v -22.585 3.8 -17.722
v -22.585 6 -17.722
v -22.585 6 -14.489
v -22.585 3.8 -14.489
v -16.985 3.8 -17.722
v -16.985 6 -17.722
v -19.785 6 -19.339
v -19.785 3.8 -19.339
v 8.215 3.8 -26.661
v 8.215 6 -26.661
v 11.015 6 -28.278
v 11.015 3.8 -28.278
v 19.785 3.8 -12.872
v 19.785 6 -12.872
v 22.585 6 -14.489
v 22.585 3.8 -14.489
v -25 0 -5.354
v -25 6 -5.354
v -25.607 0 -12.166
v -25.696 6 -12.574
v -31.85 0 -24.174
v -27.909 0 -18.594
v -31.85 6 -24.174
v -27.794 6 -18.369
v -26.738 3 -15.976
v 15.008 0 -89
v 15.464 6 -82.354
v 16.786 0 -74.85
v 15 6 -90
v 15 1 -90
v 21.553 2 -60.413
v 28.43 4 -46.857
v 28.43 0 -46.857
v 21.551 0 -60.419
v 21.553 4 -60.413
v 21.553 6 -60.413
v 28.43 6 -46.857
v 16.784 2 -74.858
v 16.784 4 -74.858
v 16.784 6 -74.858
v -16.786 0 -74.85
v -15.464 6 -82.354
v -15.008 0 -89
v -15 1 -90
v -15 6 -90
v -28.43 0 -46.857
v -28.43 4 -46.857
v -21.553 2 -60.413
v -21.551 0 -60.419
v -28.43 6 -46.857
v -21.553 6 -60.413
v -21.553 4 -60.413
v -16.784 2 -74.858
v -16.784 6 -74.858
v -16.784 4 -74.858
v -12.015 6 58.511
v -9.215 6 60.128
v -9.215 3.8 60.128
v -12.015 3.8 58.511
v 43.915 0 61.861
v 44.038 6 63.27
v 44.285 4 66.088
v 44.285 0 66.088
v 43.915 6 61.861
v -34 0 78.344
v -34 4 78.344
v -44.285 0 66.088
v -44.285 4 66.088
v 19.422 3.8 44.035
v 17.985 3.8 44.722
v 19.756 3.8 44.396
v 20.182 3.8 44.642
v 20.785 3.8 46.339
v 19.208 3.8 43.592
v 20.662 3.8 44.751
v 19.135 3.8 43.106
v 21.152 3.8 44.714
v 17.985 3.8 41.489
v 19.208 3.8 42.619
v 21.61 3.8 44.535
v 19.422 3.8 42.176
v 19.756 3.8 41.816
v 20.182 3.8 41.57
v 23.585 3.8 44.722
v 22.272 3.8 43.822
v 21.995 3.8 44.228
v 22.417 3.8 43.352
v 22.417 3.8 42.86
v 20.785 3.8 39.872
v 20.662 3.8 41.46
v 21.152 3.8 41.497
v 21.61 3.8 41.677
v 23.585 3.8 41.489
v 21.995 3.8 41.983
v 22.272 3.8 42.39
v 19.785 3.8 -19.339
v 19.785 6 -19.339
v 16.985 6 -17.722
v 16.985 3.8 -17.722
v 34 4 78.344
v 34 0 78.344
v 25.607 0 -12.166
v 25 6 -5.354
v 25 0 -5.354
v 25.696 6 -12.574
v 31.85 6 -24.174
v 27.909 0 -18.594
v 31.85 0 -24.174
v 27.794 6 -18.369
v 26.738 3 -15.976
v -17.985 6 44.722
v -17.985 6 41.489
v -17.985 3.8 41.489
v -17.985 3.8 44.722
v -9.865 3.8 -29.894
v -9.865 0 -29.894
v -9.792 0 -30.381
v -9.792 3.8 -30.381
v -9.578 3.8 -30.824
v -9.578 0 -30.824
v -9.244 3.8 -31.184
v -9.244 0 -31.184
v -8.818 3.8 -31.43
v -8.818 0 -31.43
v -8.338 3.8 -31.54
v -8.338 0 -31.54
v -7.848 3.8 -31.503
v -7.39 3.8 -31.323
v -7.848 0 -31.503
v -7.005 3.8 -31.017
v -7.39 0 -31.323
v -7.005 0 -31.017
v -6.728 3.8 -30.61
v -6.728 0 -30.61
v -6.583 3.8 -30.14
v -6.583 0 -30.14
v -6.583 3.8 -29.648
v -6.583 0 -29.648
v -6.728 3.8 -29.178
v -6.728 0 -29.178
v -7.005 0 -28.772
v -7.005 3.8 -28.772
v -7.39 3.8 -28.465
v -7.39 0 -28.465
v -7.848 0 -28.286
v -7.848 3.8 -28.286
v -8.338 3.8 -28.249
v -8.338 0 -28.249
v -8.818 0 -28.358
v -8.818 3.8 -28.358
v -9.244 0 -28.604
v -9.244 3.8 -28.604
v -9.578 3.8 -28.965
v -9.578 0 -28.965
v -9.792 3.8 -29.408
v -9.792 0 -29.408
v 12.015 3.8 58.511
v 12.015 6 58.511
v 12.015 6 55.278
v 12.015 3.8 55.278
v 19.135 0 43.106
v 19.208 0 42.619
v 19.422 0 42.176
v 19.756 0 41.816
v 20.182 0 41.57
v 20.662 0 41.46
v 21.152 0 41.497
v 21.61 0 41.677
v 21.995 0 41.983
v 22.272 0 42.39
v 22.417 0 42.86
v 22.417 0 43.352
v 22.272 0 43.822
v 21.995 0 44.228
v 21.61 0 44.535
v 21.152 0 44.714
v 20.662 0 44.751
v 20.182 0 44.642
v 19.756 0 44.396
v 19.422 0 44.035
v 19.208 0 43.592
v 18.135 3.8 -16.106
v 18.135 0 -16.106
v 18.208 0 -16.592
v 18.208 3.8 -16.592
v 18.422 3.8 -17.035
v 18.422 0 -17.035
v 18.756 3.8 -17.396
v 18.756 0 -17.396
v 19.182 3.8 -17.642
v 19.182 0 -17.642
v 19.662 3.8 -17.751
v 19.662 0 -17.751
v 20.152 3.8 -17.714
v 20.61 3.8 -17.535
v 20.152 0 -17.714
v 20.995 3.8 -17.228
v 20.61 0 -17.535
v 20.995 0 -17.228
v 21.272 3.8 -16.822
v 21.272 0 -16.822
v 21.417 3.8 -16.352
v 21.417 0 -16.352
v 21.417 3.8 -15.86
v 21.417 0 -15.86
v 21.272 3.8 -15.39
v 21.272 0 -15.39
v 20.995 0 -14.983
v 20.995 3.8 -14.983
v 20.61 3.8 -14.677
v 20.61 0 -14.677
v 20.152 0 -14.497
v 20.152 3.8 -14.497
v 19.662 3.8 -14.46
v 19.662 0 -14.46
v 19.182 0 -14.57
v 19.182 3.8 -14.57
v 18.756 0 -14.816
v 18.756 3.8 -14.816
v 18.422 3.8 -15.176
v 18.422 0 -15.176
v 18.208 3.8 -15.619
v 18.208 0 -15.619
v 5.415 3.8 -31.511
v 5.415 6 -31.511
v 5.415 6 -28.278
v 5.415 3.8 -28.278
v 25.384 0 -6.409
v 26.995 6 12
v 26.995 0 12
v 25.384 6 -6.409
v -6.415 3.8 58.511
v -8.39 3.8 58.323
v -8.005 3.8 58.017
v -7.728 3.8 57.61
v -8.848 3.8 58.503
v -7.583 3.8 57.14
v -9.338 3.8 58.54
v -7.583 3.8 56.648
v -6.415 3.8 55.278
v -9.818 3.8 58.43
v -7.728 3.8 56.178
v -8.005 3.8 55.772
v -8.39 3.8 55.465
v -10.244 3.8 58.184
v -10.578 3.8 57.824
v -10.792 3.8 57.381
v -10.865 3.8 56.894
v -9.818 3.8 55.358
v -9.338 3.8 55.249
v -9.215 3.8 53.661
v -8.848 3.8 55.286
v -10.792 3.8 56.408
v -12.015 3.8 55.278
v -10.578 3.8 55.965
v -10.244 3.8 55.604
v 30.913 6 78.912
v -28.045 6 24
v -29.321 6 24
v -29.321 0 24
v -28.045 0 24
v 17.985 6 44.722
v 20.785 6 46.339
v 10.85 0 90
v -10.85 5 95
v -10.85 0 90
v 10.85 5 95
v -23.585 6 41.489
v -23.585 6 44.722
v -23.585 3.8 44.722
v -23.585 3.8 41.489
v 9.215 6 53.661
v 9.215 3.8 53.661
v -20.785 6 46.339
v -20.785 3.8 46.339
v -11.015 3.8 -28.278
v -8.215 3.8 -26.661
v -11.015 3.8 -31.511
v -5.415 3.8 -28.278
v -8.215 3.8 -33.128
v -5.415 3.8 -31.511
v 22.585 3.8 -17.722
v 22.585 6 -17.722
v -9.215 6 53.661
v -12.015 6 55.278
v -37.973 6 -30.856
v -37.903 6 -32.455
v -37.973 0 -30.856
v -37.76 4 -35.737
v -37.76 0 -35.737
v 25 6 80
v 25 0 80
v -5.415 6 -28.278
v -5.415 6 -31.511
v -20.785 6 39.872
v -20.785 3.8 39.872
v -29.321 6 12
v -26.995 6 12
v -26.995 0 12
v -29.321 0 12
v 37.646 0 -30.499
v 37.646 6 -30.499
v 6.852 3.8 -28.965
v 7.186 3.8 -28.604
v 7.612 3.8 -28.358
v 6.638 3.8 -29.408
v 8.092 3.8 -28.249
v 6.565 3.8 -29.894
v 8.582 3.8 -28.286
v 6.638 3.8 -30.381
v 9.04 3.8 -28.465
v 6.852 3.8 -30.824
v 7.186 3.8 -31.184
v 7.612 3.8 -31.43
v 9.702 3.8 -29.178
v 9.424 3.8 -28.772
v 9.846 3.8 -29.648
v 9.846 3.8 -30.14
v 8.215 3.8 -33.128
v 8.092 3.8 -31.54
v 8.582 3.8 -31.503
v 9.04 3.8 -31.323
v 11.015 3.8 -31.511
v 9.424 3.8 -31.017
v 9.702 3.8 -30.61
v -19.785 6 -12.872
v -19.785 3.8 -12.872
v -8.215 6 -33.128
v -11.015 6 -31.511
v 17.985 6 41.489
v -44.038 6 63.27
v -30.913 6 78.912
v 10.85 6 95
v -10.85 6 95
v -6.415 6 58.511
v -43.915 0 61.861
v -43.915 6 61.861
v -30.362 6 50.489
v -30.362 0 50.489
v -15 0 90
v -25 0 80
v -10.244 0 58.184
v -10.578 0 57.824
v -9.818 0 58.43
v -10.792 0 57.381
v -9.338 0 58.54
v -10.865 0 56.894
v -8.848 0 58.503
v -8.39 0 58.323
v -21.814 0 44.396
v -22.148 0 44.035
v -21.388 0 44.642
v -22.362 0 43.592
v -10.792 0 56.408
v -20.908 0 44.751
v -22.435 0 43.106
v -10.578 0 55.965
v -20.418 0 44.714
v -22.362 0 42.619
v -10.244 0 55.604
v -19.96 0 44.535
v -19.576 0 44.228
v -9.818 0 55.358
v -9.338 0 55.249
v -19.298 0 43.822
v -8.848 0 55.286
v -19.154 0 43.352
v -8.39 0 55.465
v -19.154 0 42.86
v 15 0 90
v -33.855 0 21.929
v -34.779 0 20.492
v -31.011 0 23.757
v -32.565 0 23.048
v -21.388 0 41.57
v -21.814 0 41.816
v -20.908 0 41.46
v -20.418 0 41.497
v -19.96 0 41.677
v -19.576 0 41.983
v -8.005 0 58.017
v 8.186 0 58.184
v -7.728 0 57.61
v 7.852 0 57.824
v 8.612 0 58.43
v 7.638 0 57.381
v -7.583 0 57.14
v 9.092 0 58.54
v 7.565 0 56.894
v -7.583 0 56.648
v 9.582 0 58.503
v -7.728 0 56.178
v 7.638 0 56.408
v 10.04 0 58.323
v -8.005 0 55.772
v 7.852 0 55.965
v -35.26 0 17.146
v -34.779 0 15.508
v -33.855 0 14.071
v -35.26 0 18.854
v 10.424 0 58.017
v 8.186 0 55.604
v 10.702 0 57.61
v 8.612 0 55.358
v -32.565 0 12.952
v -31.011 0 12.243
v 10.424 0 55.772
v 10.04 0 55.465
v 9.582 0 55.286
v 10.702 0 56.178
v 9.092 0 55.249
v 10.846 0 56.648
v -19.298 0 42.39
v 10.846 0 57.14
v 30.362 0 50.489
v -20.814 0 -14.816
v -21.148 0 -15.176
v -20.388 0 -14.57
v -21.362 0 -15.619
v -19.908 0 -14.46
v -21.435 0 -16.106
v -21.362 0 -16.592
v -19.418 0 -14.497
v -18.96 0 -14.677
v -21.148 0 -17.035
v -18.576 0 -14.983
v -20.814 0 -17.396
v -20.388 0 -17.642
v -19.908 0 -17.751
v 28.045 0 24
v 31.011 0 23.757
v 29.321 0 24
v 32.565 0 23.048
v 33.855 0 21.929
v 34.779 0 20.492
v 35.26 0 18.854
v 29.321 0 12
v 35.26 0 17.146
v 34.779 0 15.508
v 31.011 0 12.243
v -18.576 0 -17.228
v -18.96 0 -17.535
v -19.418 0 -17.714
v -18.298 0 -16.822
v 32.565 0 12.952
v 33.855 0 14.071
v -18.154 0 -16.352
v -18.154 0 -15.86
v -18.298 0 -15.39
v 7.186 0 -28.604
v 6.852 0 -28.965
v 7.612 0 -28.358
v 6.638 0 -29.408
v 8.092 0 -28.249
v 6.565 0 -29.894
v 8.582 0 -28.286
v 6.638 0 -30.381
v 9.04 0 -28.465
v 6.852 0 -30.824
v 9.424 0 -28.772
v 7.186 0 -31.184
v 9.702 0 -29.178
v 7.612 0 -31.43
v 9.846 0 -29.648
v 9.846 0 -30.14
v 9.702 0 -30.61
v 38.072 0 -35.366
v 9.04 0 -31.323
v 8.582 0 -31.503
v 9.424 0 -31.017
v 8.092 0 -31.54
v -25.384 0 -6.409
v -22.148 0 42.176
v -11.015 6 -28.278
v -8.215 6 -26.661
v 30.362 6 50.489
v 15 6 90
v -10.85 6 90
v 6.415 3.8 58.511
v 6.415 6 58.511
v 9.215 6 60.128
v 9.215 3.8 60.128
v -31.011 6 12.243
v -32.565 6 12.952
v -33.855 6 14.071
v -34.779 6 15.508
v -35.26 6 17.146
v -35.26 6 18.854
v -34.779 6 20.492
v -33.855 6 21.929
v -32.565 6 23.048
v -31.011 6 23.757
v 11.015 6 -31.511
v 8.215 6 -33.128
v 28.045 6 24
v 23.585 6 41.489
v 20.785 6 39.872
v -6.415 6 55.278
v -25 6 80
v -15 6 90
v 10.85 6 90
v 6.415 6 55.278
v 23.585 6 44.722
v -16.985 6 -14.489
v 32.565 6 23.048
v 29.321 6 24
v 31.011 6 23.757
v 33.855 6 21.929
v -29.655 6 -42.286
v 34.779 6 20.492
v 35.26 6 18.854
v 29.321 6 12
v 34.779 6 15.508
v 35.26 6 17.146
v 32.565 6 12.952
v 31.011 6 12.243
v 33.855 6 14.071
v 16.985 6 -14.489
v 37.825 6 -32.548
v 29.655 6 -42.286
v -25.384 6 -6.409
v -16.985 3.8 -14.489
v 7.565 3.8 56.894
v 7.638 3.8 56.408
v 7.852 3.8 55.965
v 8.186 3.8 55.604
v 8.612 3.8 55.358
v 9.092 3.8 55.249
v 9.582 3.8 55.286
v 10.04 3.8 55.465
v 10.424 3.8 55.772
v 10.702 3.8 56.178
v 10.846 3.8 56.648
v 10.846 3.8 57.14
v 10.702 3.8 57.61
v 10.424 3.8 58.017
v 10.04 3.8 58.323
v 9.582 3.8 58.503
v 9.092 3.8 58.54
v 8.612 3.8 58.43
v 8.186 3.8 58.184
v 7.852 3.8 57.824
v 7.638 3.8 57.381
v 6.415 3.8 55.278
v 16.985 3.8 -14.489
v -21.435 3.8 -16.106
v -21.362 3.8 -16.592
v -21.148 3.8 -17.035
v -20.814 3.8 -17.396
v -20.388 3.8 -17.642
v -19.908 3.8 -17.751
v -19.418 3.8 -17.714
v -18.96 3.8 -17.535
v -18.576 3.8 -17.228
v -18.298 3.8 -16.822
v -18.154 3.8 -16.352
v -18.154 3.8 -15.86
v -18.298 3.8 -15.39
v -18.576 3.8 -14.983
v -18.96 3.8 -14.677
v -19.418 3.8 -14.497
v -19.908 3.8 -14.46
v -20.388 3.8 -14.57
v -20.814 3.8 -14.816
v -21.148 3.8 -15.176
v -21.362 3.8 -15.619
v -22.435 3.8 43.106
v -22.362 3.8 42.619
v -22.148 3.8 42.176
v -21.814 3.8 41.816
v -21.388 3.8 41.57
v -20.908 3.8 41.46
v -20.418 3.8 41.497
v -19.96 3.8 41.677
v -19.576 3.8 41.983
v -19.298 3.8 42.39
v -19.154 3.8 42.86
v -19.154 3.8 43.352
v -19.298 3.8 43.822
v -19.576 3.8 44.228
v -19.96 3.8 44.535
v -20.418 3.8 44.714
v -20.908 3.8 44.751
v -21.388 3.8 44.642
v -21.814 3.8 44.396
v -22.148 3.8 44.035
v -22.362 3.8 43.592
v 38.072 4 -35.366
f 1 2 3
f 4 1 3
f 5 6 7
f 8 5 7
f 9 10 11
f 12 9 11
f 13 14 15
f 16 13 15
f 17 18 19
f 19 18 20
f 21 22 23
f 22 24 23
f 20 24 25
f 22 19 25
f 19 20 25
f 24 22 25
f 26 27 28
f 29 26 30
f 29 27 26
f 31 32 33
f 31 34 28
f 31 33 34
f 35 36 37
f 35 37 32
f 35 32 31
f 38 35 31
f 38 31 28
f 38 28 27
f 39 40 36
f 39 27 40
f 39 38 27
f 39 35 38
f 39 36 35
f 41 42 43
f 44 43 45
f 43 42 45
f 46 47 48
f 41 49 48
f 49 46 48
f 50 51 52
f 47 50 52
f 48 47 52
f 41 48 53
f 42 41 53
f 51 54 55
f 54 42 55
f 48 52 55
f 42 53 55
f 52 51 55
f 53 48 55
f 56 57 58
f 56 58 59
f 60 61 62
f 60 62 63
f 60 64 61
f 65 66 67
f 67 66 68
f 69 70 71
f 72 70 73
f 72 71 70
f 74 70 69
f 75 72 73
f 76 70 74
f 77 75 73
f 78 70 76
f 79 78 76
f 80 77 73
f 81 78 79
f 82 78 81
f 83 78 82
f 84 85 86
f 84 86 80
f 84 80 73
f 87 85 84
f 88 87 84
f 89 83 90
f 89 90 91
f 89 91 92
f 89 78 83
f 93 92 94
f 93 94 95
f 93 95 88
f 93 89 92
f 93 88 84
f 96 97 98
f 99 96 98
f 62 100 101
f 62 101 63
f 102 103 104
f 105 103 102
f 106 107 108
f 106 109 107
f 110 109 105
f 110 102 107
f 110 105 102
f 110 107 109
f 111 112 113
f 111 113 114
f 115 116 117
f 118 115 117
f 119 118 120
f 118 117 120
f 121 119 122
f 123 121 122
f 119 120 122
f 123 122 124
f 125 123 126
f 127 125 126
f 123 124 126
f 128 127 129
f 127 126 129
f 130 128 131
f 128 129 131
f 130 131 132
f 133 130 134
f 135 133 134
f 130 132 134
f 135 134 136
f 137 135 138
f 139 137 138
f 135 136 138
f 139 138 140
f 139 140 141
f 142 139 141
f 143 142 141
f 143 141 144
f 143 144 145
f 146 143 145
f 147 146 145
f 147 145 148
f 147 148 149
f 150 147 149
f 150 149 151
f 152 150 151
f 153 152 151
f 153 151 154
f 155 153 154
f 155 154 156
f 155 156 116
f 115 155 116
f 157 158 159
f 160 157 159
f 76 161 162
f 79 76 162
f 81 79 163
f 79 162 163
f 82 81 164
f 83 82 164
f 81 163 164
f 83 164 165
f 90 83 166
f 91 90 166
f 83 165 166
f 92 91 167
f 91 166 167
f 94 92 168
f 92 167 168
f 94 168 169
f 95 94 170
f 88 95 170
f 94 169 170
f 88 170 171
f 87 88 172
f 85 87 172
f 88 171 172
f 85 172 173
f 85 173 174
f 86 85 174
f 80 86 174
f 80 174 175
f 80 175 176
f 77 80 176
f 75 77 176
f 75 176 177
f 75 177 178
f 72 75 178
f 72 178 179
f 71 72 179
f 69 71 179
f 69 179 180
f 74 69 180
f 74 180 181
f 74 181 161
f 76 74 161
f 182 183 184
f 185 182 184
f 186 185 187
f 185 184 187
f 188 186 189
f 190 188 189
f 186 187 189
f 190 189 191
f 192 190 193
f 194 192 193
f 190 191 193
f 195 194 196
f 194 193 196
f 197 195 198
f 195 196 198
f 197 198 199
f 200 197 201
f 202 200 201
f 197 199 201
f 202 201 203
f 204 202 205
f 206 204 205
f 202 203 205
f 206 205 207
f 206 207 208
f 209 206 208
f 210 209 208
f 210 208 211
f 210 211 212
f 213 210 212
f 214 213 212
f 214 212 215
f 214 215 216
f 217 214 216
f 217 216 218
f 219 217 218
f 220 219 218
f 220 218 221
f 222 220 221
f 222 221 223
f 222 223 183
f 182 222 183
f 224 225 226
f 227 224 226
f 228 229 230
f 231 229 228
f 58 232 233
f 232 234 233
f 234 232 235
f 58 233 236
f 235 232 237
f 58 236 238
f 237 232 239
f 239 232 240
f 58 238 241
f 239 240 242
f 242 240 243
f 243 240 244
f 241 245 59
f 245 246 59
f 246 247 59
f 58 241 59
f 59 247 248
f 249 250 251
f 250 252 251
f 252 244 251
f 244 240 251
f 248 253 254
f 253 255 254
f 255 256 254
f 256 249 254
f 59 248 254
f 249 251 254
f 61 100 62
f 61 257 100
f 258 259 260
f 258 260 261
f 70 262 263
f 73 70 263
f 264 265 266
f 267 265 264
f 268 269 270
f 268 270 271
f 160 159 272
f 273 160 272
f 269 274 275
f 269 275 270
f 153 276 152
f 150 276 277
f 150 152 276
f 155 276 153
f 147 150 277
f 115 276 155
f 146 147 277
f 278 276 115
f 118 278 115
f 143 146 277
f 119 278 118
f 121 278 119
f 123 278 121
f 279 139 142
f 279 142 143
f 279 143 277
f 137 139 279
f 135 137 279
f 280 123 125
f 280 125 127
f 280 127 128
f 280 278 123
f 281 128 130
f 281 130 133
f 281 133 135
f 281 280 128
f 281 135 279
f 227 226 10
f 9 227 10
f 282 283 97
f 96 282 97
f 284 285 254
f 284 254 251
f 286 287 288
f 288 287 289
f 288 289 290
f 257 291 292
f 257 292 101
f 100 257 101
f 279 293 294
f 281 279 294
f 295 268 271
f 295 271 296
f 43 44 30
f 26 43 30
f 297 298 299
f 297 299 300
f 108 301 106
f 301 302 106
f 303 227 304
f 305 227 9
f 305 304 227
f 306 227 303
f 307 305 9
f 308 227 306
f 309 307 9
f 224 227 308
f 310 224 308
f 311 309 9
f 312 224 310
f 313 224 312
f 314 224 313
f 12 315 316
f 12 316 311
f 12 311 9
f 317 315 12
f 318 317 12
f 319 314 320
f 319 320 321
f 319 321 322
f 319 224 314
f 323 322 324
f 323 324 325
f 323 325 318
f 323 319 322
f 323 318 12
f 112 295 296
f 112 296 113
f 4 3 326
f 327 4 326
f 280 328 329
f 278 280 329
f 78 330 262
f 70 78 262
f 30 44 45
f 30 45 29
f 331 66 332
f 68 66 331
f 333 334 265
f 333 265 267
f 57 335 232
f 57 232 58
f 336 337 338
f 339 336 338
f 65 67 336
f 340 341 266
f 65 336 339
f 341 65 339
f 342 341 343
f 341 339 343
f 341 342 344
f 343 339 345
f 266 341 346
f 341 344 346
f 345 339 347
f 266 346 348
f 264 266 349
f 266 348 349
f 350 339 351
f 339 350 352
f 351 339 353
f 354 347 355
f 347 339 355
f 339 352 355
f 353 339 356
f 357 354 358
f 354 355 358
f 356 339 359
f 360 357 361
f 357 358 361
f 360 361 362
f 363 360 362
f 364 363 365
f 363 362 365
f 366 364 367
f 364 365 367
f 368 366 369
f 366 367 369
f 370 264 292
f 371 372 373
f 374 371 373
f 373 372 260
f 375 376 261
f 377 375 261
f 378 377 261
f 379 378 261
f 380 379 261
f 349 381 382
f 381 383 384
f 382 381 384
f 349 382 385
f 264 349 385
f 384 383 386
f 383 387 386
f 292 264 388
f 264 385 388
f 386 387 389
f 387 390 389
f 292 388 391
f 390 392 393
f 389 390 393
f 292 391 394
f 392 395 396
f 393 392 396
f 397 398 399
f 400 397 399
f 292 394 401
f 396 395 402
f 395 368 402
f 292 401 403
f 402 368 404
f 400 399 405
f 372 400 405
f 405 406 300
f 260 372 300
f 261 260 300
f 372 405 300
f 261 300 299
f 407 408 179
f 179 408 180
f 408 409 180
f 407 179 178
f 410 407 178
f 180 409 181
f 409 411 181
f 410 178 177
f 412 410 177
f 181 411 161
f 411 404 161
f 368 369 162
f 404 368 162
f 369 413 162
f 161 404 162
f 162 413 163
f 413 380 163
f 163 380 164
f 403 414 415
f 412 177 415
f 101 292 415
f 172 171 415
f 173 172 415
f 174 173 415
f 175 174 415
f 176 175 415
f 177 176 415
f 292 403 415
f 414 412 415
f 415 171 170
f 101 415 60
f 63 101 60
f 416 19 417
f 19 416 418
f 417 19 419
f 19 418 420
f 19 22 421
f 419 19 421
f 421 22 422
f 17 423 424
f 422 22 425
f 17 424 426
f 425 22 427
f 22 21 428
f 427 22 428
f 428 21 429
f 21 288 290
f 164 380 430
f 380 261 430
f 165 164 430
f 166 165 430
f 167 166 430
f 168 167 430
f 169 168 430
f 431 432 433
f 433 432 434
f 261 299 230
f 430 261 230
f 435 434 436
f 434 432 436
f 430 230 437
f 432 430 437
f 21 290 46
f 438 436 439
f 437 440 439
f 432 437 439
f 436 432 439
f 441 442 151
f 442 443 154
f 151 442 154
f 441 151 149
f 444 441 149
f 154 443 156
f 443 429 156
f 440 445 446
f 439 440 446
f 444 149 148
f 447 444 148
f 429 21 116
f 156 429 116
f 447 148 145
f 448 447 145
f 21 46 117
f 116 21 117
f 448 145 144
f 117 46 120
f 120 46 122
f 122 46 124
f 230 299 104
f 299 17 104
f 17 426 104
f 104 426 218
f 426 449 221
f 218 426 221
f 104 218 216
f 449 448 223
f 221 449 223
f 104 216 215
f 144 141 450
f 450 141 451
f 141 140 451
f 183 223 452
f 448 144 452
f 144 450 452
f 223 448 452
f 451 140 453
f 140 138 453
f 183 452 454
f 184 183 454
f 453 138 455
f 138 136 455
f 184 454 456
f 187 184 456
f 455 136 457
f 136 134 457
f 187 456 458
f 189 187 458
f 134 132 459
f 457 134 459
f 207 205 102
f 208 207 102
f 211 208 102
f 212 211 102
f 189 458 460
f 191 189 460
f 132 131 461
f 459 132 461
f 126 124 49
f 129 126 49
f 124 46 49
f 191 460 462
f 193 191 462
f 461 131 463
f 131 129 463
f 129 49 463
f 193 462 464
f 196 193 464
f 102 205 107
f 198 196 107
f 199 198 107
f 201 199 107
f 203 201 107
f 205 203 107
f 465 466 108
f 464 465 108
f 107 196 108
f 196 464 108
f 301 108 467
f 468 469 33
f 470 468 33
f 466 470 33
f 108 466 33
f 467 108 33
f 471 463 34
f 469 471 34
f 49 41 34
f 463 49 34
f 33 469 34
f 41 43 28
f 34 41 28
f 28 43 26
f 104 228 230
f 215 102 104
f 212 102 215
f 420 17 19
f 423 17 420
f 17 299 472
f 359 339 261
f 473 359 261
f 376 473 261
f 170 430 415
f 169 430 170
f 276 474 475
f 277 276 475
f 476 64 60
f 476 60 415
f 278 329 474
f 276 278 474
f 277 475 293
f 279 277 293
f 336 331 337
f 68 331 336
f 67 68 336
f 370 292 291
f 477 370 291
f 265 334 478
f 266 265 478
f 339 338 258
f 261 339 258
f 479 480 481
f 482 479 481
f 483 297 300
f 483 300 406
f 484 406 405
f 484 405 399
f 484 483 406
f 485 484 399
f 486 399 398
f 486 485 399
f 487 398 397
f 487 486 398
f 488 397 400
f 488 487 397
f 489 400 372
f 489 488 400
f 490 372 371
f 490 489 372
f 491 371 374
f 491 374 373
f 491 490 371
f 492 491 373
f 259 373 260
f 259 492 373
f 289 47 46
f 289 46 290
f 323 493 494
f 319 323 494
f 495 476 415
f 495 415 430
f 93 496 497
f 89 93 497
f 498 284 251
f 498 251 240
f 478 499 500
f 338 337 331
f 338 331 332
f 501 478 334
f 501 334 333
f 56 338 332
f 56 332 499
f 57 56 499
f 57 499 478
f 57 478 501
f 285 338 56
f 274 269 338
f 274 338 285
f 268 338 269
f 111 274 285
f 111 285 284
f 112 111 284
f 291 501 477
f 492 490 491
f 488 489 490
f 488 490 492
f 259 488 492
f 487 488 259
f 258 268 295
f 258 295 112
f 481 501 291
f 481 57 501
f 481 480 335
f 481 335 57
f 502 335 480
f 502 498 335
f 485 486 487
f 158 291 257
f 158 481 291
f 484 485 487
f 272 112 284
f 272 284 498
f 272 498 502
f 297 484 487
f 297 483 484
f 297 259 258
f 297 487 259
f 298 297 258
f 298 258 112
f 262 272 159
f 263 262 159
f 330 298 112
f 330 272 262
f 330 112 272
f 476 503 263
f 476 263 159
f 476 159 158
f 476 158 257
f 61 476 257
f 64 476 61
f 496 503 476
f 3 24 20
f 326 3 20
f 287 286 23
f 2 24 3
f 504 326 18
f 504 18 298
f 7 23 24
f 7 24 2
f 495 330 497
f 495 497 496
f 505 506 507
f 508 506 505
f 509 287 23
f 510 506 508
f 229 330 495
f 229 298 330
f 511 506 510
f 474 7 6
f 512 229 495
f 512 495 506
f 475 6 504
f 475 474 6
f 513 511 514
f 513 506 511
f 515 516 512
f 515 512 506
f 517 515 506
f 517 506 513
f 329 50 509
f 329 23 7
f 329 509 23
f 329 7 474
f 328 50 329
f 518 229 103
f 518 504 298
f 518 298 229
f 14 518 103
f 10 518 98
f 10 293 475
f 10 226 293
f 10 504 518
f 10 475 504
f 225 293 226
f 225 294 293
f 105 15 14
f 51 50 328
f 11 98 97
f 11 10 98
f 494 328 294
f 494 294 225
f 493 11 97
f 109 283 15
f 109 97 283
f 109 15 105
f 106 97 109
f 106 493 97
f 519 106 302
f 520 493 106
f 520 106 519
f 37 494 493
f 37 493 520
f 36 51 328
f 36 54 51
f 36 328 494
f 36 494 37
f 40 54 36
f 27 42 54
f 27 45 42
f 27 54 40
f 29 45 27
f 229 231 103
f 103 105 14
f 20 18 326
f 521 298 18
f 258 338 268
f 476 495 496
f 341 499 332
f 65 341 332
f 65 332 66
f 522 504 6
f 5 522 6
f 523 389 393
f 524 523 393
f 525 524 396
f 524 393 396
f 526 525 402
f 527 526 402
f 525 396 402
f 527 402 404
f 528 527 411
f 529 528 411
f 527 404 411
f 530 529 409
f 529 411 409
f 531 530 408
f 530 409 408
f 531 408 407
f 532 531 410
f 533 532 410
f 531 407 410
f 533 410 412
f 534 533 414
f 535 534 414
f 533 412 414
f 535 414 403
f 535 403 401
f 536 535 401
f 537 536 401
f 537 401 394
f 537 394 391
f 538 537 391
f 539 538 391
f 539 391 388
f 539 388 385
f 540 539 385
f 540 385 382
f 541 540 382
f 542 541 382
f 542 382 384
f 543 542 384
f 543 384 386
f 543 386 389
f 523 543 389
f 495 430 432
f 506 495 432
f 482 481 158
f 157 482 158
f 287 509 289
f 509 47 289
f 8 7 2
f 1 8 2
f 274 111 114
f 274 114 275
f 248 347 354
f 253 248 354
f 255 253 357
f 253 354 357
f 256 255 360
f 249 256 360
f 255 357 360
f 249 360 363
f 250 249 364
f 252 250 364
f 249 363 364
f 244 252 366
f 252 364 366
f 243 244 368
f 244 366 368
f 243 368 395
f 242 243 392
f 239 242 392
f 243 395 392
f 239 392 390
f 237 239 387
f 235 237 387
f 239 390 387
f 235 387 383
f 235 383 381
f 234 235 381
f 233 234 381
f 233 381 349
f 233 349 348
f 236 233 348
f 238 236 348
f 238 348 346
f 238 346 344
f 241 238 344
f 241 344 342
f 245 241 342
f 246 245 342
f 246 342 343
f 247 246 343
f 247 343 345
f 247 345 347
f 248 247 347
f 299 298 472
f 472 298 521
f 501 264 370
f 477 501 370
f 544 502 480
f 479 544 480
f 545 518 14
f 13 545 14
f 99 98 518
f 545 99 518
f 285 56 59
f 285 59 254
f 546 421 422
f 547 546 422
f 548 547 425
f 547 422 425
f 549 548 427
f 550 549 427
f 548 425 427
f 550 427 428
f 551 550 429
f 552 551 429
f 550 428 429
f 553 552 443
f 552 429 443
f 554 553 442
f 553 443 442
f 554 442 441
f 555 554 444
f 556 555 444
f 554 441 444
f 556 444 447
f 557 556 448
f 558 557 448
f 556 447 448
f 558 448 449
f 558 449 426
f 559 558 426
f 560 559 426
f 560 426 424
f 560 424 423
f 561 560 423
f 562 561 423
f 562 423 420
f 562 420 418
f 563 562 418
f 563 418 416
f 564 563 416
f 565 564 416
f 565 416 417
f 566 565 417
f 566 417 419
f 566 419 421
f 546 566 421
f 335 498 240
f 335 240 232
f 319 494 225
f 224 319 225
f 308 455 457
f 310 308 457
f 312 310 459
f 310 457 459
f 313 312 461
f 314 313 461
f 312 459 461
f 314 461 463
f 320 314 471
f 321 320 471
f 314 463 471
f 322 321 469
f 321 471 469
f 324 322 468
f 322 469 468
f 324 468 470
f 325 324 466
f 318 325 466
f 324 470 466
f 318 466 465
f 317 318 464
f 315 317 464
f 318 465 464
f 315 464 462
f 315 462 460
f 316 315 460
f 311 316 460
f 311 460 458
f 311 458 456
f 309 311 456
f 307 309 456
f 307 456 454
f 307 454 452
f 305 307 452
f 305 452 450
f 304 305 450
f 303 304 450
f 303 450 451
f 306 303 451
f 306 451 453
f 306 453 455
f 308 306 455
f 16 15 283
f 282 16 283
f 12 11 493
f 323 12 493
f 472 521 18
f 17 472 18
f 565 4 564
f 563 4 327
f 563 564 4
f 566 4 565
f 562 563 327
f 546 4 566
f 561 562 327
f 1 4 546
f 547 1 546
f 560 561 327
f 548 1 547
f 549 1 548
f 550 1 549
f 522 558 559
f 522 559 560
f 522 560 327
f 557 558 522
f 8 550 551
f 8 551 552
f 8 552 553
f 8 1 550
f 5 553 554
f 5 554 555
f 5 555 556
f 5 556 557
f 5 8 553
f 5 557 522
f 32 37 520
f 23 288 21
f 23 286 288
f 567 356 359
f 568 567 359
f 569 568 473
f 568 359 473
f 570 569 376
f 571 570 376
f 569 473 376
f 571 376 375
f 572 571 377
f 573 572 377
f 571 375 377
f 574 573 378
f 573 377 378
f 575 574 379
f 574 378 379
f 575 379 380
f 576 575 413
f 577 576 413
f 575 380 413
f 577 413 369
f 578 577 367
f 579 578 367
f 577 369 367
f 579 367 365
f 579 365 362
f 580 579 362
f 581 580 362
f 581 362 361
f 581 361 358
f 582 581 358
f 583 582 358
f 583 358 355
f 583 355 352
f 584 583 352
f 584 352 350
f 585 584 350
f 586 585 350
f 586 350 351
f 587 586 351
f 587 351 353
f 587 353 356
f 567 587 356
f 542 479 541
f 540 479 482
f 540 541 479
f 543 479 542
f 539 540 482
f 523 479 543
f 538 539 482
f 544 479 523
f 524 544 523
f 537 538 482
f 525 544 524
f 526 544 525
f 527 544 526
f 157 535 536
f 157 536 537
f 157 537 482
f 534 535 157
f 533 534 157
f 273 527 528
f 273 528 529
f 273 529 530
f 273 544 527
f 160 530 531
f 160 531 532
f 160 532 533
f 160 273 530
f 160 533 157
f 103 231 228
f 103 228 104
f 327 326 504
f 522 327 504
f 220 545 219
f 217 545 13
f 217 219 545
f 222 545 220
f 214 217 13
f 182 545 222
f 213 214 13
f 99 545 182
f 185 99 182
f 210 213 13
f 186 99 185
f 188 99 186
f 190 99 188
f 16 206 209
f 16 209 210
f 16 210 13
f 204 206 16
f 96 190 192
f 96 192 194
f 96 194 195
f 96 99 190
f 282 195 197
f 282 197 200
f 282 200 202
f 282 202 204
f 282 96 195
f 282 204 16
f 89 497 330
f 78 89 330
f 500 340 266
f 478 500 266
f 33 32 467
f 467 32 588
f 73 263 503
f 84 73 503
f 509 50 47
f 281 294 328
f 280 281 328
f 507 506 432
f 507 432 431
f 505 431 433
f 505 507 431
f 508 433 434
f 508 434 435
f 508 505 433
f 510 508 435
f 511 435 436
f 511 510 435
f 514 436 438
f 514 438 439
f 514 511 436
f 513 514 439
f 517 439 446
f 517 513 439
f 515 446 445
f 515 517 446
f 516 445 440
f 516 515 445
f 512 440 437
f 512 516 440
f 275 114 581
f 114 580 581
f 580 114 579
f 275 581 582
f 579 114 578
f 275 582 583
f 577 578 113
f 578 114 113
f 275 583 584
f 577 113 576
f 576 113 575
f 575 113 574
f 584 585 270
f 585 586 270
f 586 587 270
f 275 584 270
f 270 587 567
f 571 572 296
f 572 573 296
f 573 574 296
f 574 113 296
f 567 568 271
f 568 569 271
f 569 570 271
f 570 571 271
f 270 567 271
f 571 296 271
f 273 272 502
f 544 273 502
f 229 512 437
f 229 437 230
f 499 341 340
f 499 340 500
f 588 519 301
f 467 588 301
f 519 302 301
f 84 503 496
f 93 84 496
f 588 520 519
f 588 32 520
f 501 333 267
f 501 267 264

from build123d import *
from OCP.BRepFilletAPI import BRepFilletAPI_MakeChamfer

# Parameters (mm, degrees)
SKETCH1_W                  = 50
SKETCH1_H                  = 180
BOSS_EXTRUDE1_DEPTH        = 6
CHAMFER2_SIZE              = 10
F_3_3_3_3_DIAMETER_HOLE1_D = 3.3
BOSS_EXTRUDE3_DEPTH        = 6
CUT_EXTRUDE3_DEPTH         = 2.2
BOSS_EXTRUDE4_DEPTH        = 6
CHAMFER14_SIZE             = 2
CHAMFER16_SIZE             = 7
CHAMFER16_SIZE_2           = 56.79198309
CHAMFER17_SIZE             = 2
SKETCH59_W                 = 21.7
SKETCH59_H                 = 5
BOSS_EXTRUDE5_DEPTH        = 6
CHAMFER19_SIZE             = 5
CUT_EXTRUDE28_DEPTH        = 106.814167745
CHAMFER20_SIZE             = 3
CHAMFER20_SIZE2            = 3.484649721
CUT_EXTRUDE29_DEPTH        = 105.986313168
CHAMFER24_SIZE             = 1
CUT_EXTRUDE31_DEPTH        = 105.986313306
SKETCH66_R                 = 6
BOSS_EXTRUDE6_DEPTH        = 6


with BuildPart() as part:
    # Sketch1 → Boss-Extrude1 (new body)
    with BuildSketch(Plane(origin=(0, 0, 0), x_dir=(1, 0, 0), z_dir=(0, 1, 0))):
        Rectangle(SKETCH1_W, SKETCH1_H)
    extrude(amount=BOSS_EXTRUDE1_DEPTH)

    # Chamfer2
    chamfer2_edges = [part.edges().sort_by_distance(p)[0] for p in [
        (-25, 3, -90),
        (25, 3, -90),
        (25, 3, 90),
        (-25, 3, 90),
    ]]
    chamfer(chamfer2_edges, length=CHAMFER2_SIZE)

    # Ø3.3 (3.3) Diameter Hole1 (through all)
    with Locations(Plane(origin=(0, 6, 0), x_dir=(1, 0, 0), z_dir=(0, 1, 0))):
        with Locations((-19.785088487, 16.105600012), (9.214911513, -56.894399988), (20.785088487, -43.105600012), (-9.214911513, -56.894399988), (-20.785088487, -43.105600012), (19.785088487, 16.105600012), (8.214911513, 29.894399988), (-8.214911513, 29.894399988)):
            Hole(F_3_3_3_3_DIAMETER_HOLE1_D / 2)

    # Sketch52 → Boss-Extrude3 (add, through all)
    with BuildSketch(Plane(origin=(0, 6, 0), x_dir=(1, 0, 0), z_dir=(0, 1, 0))):
        Polygon((40, 33.067924807), (31.85, 24.173760523), (25, 5.3535402), (25, 59.656998575), (28.429823026, 46.856724783), align=None)
        Polygon((-28.429823026, 46.856724783), (-40, 33.067924807), (-31.85, 24.173760523), (-25, 5.3535402), (-25, 59.656998575), align=None)
    extrude(amount=-BOSS_EXTRUDE3_DEPTH)

    # Sketch11 → Cut-Extrude3 (cut)
    with BuildSketch(Plane(origin=(0, 6, 0), x_dir=(1, 0, 0), z_dir=(0, 1, 0))):
        Polygon((23.585088487, -44.722180766), (23.585088487, -41.489019258), (20.785088487, -39.872438504), (17.985088487, -41.489019258), (17.985088487, -44.722180766), (20.785088487, -46.338761519), align=None)
        Polygon((9.214911513, -60.127561496), (12.014911513, -58.510980742), (12.014911513, -55.277819234), (9.214911513, -53.661238481), (6.414911513, -55.277819234), (6.414911513, -58.510980742), align=None)
        Polygon((-6.414911513, -58.510980742), (-9.214911513, -60.127561496), (-12.014911513, -58.510980742), (-12.014911513, -55.277819234), (-9.214911513, -53.661238481), (-6.414911513, -55.277819234), align=None)
        Polygon((-20.785088487, -46.338761519), (-23.585088487, -44.722180766), (-23.585088487, -41.489019258), (-20.785088487, -39.872438504), (-17.985088487, -41.489019258), (-17.985088487, -44.722180766), align=None)
        Polygon((19.785088487, 12.872438504), (22.585088487, 14.489019258), (22.585088487, 17.722180766), (19.785088487, 19.338761519), (16.985088487, 17.722180766), (16.985088487, 14.489019258), align=None)
        Polygon((8.214911513, 26.661238481), (11.014911513, 28.277819234), (11.014911513, 31.510980742), (8.214911513, 33.127561496), (5.414911513, 31.510980742), (5.414911513, 28.277819234), align=None)
        Polygon((-19.785088487, 12.872438504), (-16.985088487, 14.489019258), (-16.985088487, 17.722180766), (-19.785088487, 19.338761519), (-22.585088487, 17.722180766), (-22.585088487, 14.489019258), align=None)
        Polygon((-8.214911513, 26.661238481), (-5.414911513, 28.277819234), (-5.414911513, 31.510980742), (-8.214911513, 33.127561496), (-11.014911513, 31.510980742), (-11.014911513, 28.277819234), align=None)
    extrude(amount=-CUT_EXTRUDE3_DEPTH, mode=Mode.SUBTRACT)

    # Sketch53 → Boss-Extrude4 (add, through all)
    with BuildSketch(Plane(origin=(0, 6, 0), x_dir=(1, 0, 0), z_dir=(0, 1, 0))):
        Polygon((25, -45.989627063), (25, -80), (34, -78.344262241), (46.212964584, -63.789417822), align=None)
        Polygon((-46.212964584, -63.789417822), (-25, -45.989627063), (-25, -80), (-34, -78.344262241), align=None)
    extrude(amount=-BOSS_EXTRUDE4_DEPTH)

    # Chamfer14
    chamfer14_edges = [part.edges().sort_by_distance(p)[0] for p in [
        (-40.106482292, 6, 71.066840031),
        (40.106482292, 6, 71.066840031),
    ]]
    chamfer(chamfer14_edges, length=CHAMFER14_SIZE)

    # Chamfer16
    # the kernel refuses this chamfer: 56.79198309, 7 mm, written as the material it adds along each edge
    with BuildSketch(Plane(origin=(25, 6, 45.989627063), x_dir=(0.6351042832999635, 0, 0.7724264038301901), z_dir=(0, -1, 0))) as chamfer16_piece_1:
        Polygon((CHAMFER16_SIZE * 0.9830242288, -CHAMFER16_SIZE * 0.183475790208), (-CHAMFER16_SIZE_2 * 0.772426403828, -CHAMFER16_SIZE_2 * 0.635104283298), (0, 0), align=None)
    extrude(amount=6)
    with BuildSketch(Plane(origin=(-25, 6, 45.989627063), x_dir=(-0.6351042832999635, 0, 0.7724264038301901), z_dir=(0, -1, 0))) as chamfer16_piece_2:
        Polygon((CHAMFER16_SIZE * 0.9830242288, CHAMFER16_SIZE * 0.183475790208), (-CHAMFER16_SIZE_2 * 0.772426403828, CHAMFER16_SIZE_2 * 0.635104283298), (0, 0), align=None)
    extrude(amount=6)

    # Chamfer17
    chamfer17_edges = [part.edges().sort_by_distance(p)[0] for p in [
        (-34.214911513, 6, -39.962324795),
        (34.214911513, 6, -39.962324795),
    ]]
    chamfer(chamfer17_edges, length=CHAMFER17_SIZE)

    # Sketch59 → Boss-Extrude5 (add, through all)
    with BuildSketch(Plane(origin=(0, 6, 0), x_dir=(1, 0, 0), z_dir=(0, 1, 0))):
        with Locations((0, -92.5)):
            Rectangle(SKETCH59_W, SKETCH59_H)
    extrude(amount=-BOSS_EXTRUDE5_DEPTH)

    # Chamfer19
    chamfer19_edges = [part.edges().sort_by_distance(p)[0] for p in [
        (0, 0, 95),
    ]]
    chamfer(chamfer19_edges, length=CHAMFER19_SIZE)

    # Sketch61 → Cut-Extrude28 (cut, through all)
    with BuildSketch(Plane.XZ):
        Polygon((25, -59.656998575), (15, -90), (25, -80), align=None)
        Polygon((-25, -80), (-25, -59.656998575), (-15, -90), align=None)
    extrude(amount=-CUT_EXTRUDE28_DEPTH, mode=Mode.SUBTRACT)

    # Chamfer20: one chamfer whose edges measure the first distance from different faces: ONE call of the kernel's chamfer builder (chamfer() names one face for all edges)
    chamfer20_edges_1 = [part.edges().sort_by_distance(p)[0] for p in [
        (-40, 2, -33.067924807),
    ]]
    chamfer20_side_1 = [part.faces().sort_by_distance(p)[0] for p in [
        (-35.821197815, 2.933105821, -28.507562458),
    ]]
    chamfer20_edges_2 = [part.edges().sort_by_distance(p)[0] for p in [
        (40, 2, -33.067924807),
    ]]
    chamfer20_side_2 = [part.faces().sort_by_distance(p)[0] for p in [
        (34.214911513, 2, -39.962324795),
    ]]
    chamfer20_edges_3 = [part.edges().sort_by_distance(p)[0] for p in [
        (-46.212964584, 2, 63.789417822),
        (46.212964584, 2, 63.789417822),
    ]]
    chamfer20 = BRepFilletAPI_MakeChamfer(part.part.solid().wrapped)
    for e in chamfer20_edges_1:
        chamfer20.Add(CHAMFER20_SIZE, CHAMFER20_SIZE2, e.wrapped, chamfer20_side_1[0].wrapped)  # the first distance lies on this face
    for e in chamfer20_edges_2:
        chamfer20.Add(CHAMFER20_SIZE, CHAMFER20_SIZE2, e.wrapped, chamfer20_side_2[0].wrapped)  # the first distance lies on this face
    for e in chamfer20_edges_3:
        chamfer20.Add(CHAMFER20_SIZE, e.wrapped)
    add(Compound.cast(chamfer20.Shape()), mode=Mode.REPLACE)

    # Sketch62 → Cut-Extrude29 (cut, through all)
    with BuildSketch(Plane(origin=(0, 6, 0), x_dir=(1, 0, 0), z_dir=(0, 1, 0))):
        with BuildLine():
            Line((15, 90), (25, 59.656998575))
            Line((25, 59.656998575), (28.429823026, 46.856724783))
            add(Edge.make_bspline(
                [(28.429823026, 46.856724783), (20.791344098, 59.90516311), (15, 74.573823319), (15, 90)],
                knots=[0, 0, 0, 0, 1, 1, 1, 1], degree=3))
        make_face()
        with BuildLine():
            Line((-25, 59.656998575), (-28.429823026, 46.856724783))
            add(Edge.make_bspline(
                [(-28.429823026, 46.856724783), (-20.791344098, 59.90516311), (-15, 74.573823319), (-15, 90)],
                knots=[0, 0, 0, 0, 1, 1, 1, 1], degree=3))
            Line((-15, 90), (-25, 59.656998575))
        make_face()
    extrude(amount=-CUT_EXTRUDE29_DEPTH, mode=Mode.SUBTRACT)

    # Chamfer24
    chamfer24_edges = [part.edges().sort_by_distance(p)[0] for p in [
        (0, 0, -90),
    ]]
    chamfer(chamfer24_edges, length=CHAMFER24_SIZE)

    # Sketch64 → Cut-Extrude31 (cut, through all)
    with BuildSketch(Plane(origin=(0, 6, 0), x_dir=(1, 0, 0), z_dir=(0, 1, 0))):
        with BuildLine():
            Line((31.85, 24.173760523), (25, 5.3535402))
            add(Edge.make_bspline(
                [(25, 5.3535402), (25, 9.939182196), (26.103782981, 15.682971222), (29.276150019, 21.364896158), (31.85, 24.173760523)],
                knots=[0, 0, 0, 0, 0.526973907, 1, 1, 1, 1], degree=3))
        make_face()
        with BuildLine():
            Line((-31.85, 24.173760523), (-25, 5.3535402))
            add(Edge.make_bspline(
                [(-25, 5.3535402), (-25, 9.939182196), (-26.103782981, 15.682971222), (-29.276150019, 21.364896158), (-31.85, 24.173760523)],
                knots=[0, 0, 0, 0, 0.526973907, 1, 1, 1, 1], degree=3))
        make_face()
    extrude(amount=-CUT_EXTRUDE31_DEPTH, mode=Mode.SUBTRACT)

    # Sketch66 → Boss-Extrude6 (add)
    with BuildSketch(Plane(origin=(0, 6, 0), x_dir=(1, 0, 0), z_dir=(0, 1, 0))):
        with Locations((29.320888862, -18)):
            Circle(SKETCH66_R)
        with BuildLine():
            ThreePointArc((25, -13.837078017), (26.973287097, -12.478336668), (29.320888862, -12))
            Line((29.320888862, -12), (25, -12))
            Line((25, -12), (25, -13.837078017))
        make_face()
        with BuildLine():
            Line((25, -24), (29.320888862, -24))
            ThreePointArc((29.320888862, -24), (26.973287097, -23.521663332), (25, -22.162921983))
            Line((25, -22.162921983), (25, -24))
        make_face()
        with Locations((-29.320888862, -18)):
            Circle(SKETCH66_R)
        with BuildLine():
            Line((-25, -12), (-29.320888862, -12))
            ThreePointArc((-29.320888862, -12), (-26.973287097, -12.478336668), (-25, -13.837078017))
            Line((-25, -13.837078017), (-25, -12))
        make_face()
        with BuildLine():
            ThreePointArc((-25, -22.162921983), (-26.973287097, -23.521663332), (-29.320888862, -24))
            Line((-29.320888862, -24), (-25, -24))
            Line((-25, -24), (-25, -22.162921983))
        make_face()
    extrude(amount=-BOSS_EXTRUDE6_DEPTH)


solid = part.part
